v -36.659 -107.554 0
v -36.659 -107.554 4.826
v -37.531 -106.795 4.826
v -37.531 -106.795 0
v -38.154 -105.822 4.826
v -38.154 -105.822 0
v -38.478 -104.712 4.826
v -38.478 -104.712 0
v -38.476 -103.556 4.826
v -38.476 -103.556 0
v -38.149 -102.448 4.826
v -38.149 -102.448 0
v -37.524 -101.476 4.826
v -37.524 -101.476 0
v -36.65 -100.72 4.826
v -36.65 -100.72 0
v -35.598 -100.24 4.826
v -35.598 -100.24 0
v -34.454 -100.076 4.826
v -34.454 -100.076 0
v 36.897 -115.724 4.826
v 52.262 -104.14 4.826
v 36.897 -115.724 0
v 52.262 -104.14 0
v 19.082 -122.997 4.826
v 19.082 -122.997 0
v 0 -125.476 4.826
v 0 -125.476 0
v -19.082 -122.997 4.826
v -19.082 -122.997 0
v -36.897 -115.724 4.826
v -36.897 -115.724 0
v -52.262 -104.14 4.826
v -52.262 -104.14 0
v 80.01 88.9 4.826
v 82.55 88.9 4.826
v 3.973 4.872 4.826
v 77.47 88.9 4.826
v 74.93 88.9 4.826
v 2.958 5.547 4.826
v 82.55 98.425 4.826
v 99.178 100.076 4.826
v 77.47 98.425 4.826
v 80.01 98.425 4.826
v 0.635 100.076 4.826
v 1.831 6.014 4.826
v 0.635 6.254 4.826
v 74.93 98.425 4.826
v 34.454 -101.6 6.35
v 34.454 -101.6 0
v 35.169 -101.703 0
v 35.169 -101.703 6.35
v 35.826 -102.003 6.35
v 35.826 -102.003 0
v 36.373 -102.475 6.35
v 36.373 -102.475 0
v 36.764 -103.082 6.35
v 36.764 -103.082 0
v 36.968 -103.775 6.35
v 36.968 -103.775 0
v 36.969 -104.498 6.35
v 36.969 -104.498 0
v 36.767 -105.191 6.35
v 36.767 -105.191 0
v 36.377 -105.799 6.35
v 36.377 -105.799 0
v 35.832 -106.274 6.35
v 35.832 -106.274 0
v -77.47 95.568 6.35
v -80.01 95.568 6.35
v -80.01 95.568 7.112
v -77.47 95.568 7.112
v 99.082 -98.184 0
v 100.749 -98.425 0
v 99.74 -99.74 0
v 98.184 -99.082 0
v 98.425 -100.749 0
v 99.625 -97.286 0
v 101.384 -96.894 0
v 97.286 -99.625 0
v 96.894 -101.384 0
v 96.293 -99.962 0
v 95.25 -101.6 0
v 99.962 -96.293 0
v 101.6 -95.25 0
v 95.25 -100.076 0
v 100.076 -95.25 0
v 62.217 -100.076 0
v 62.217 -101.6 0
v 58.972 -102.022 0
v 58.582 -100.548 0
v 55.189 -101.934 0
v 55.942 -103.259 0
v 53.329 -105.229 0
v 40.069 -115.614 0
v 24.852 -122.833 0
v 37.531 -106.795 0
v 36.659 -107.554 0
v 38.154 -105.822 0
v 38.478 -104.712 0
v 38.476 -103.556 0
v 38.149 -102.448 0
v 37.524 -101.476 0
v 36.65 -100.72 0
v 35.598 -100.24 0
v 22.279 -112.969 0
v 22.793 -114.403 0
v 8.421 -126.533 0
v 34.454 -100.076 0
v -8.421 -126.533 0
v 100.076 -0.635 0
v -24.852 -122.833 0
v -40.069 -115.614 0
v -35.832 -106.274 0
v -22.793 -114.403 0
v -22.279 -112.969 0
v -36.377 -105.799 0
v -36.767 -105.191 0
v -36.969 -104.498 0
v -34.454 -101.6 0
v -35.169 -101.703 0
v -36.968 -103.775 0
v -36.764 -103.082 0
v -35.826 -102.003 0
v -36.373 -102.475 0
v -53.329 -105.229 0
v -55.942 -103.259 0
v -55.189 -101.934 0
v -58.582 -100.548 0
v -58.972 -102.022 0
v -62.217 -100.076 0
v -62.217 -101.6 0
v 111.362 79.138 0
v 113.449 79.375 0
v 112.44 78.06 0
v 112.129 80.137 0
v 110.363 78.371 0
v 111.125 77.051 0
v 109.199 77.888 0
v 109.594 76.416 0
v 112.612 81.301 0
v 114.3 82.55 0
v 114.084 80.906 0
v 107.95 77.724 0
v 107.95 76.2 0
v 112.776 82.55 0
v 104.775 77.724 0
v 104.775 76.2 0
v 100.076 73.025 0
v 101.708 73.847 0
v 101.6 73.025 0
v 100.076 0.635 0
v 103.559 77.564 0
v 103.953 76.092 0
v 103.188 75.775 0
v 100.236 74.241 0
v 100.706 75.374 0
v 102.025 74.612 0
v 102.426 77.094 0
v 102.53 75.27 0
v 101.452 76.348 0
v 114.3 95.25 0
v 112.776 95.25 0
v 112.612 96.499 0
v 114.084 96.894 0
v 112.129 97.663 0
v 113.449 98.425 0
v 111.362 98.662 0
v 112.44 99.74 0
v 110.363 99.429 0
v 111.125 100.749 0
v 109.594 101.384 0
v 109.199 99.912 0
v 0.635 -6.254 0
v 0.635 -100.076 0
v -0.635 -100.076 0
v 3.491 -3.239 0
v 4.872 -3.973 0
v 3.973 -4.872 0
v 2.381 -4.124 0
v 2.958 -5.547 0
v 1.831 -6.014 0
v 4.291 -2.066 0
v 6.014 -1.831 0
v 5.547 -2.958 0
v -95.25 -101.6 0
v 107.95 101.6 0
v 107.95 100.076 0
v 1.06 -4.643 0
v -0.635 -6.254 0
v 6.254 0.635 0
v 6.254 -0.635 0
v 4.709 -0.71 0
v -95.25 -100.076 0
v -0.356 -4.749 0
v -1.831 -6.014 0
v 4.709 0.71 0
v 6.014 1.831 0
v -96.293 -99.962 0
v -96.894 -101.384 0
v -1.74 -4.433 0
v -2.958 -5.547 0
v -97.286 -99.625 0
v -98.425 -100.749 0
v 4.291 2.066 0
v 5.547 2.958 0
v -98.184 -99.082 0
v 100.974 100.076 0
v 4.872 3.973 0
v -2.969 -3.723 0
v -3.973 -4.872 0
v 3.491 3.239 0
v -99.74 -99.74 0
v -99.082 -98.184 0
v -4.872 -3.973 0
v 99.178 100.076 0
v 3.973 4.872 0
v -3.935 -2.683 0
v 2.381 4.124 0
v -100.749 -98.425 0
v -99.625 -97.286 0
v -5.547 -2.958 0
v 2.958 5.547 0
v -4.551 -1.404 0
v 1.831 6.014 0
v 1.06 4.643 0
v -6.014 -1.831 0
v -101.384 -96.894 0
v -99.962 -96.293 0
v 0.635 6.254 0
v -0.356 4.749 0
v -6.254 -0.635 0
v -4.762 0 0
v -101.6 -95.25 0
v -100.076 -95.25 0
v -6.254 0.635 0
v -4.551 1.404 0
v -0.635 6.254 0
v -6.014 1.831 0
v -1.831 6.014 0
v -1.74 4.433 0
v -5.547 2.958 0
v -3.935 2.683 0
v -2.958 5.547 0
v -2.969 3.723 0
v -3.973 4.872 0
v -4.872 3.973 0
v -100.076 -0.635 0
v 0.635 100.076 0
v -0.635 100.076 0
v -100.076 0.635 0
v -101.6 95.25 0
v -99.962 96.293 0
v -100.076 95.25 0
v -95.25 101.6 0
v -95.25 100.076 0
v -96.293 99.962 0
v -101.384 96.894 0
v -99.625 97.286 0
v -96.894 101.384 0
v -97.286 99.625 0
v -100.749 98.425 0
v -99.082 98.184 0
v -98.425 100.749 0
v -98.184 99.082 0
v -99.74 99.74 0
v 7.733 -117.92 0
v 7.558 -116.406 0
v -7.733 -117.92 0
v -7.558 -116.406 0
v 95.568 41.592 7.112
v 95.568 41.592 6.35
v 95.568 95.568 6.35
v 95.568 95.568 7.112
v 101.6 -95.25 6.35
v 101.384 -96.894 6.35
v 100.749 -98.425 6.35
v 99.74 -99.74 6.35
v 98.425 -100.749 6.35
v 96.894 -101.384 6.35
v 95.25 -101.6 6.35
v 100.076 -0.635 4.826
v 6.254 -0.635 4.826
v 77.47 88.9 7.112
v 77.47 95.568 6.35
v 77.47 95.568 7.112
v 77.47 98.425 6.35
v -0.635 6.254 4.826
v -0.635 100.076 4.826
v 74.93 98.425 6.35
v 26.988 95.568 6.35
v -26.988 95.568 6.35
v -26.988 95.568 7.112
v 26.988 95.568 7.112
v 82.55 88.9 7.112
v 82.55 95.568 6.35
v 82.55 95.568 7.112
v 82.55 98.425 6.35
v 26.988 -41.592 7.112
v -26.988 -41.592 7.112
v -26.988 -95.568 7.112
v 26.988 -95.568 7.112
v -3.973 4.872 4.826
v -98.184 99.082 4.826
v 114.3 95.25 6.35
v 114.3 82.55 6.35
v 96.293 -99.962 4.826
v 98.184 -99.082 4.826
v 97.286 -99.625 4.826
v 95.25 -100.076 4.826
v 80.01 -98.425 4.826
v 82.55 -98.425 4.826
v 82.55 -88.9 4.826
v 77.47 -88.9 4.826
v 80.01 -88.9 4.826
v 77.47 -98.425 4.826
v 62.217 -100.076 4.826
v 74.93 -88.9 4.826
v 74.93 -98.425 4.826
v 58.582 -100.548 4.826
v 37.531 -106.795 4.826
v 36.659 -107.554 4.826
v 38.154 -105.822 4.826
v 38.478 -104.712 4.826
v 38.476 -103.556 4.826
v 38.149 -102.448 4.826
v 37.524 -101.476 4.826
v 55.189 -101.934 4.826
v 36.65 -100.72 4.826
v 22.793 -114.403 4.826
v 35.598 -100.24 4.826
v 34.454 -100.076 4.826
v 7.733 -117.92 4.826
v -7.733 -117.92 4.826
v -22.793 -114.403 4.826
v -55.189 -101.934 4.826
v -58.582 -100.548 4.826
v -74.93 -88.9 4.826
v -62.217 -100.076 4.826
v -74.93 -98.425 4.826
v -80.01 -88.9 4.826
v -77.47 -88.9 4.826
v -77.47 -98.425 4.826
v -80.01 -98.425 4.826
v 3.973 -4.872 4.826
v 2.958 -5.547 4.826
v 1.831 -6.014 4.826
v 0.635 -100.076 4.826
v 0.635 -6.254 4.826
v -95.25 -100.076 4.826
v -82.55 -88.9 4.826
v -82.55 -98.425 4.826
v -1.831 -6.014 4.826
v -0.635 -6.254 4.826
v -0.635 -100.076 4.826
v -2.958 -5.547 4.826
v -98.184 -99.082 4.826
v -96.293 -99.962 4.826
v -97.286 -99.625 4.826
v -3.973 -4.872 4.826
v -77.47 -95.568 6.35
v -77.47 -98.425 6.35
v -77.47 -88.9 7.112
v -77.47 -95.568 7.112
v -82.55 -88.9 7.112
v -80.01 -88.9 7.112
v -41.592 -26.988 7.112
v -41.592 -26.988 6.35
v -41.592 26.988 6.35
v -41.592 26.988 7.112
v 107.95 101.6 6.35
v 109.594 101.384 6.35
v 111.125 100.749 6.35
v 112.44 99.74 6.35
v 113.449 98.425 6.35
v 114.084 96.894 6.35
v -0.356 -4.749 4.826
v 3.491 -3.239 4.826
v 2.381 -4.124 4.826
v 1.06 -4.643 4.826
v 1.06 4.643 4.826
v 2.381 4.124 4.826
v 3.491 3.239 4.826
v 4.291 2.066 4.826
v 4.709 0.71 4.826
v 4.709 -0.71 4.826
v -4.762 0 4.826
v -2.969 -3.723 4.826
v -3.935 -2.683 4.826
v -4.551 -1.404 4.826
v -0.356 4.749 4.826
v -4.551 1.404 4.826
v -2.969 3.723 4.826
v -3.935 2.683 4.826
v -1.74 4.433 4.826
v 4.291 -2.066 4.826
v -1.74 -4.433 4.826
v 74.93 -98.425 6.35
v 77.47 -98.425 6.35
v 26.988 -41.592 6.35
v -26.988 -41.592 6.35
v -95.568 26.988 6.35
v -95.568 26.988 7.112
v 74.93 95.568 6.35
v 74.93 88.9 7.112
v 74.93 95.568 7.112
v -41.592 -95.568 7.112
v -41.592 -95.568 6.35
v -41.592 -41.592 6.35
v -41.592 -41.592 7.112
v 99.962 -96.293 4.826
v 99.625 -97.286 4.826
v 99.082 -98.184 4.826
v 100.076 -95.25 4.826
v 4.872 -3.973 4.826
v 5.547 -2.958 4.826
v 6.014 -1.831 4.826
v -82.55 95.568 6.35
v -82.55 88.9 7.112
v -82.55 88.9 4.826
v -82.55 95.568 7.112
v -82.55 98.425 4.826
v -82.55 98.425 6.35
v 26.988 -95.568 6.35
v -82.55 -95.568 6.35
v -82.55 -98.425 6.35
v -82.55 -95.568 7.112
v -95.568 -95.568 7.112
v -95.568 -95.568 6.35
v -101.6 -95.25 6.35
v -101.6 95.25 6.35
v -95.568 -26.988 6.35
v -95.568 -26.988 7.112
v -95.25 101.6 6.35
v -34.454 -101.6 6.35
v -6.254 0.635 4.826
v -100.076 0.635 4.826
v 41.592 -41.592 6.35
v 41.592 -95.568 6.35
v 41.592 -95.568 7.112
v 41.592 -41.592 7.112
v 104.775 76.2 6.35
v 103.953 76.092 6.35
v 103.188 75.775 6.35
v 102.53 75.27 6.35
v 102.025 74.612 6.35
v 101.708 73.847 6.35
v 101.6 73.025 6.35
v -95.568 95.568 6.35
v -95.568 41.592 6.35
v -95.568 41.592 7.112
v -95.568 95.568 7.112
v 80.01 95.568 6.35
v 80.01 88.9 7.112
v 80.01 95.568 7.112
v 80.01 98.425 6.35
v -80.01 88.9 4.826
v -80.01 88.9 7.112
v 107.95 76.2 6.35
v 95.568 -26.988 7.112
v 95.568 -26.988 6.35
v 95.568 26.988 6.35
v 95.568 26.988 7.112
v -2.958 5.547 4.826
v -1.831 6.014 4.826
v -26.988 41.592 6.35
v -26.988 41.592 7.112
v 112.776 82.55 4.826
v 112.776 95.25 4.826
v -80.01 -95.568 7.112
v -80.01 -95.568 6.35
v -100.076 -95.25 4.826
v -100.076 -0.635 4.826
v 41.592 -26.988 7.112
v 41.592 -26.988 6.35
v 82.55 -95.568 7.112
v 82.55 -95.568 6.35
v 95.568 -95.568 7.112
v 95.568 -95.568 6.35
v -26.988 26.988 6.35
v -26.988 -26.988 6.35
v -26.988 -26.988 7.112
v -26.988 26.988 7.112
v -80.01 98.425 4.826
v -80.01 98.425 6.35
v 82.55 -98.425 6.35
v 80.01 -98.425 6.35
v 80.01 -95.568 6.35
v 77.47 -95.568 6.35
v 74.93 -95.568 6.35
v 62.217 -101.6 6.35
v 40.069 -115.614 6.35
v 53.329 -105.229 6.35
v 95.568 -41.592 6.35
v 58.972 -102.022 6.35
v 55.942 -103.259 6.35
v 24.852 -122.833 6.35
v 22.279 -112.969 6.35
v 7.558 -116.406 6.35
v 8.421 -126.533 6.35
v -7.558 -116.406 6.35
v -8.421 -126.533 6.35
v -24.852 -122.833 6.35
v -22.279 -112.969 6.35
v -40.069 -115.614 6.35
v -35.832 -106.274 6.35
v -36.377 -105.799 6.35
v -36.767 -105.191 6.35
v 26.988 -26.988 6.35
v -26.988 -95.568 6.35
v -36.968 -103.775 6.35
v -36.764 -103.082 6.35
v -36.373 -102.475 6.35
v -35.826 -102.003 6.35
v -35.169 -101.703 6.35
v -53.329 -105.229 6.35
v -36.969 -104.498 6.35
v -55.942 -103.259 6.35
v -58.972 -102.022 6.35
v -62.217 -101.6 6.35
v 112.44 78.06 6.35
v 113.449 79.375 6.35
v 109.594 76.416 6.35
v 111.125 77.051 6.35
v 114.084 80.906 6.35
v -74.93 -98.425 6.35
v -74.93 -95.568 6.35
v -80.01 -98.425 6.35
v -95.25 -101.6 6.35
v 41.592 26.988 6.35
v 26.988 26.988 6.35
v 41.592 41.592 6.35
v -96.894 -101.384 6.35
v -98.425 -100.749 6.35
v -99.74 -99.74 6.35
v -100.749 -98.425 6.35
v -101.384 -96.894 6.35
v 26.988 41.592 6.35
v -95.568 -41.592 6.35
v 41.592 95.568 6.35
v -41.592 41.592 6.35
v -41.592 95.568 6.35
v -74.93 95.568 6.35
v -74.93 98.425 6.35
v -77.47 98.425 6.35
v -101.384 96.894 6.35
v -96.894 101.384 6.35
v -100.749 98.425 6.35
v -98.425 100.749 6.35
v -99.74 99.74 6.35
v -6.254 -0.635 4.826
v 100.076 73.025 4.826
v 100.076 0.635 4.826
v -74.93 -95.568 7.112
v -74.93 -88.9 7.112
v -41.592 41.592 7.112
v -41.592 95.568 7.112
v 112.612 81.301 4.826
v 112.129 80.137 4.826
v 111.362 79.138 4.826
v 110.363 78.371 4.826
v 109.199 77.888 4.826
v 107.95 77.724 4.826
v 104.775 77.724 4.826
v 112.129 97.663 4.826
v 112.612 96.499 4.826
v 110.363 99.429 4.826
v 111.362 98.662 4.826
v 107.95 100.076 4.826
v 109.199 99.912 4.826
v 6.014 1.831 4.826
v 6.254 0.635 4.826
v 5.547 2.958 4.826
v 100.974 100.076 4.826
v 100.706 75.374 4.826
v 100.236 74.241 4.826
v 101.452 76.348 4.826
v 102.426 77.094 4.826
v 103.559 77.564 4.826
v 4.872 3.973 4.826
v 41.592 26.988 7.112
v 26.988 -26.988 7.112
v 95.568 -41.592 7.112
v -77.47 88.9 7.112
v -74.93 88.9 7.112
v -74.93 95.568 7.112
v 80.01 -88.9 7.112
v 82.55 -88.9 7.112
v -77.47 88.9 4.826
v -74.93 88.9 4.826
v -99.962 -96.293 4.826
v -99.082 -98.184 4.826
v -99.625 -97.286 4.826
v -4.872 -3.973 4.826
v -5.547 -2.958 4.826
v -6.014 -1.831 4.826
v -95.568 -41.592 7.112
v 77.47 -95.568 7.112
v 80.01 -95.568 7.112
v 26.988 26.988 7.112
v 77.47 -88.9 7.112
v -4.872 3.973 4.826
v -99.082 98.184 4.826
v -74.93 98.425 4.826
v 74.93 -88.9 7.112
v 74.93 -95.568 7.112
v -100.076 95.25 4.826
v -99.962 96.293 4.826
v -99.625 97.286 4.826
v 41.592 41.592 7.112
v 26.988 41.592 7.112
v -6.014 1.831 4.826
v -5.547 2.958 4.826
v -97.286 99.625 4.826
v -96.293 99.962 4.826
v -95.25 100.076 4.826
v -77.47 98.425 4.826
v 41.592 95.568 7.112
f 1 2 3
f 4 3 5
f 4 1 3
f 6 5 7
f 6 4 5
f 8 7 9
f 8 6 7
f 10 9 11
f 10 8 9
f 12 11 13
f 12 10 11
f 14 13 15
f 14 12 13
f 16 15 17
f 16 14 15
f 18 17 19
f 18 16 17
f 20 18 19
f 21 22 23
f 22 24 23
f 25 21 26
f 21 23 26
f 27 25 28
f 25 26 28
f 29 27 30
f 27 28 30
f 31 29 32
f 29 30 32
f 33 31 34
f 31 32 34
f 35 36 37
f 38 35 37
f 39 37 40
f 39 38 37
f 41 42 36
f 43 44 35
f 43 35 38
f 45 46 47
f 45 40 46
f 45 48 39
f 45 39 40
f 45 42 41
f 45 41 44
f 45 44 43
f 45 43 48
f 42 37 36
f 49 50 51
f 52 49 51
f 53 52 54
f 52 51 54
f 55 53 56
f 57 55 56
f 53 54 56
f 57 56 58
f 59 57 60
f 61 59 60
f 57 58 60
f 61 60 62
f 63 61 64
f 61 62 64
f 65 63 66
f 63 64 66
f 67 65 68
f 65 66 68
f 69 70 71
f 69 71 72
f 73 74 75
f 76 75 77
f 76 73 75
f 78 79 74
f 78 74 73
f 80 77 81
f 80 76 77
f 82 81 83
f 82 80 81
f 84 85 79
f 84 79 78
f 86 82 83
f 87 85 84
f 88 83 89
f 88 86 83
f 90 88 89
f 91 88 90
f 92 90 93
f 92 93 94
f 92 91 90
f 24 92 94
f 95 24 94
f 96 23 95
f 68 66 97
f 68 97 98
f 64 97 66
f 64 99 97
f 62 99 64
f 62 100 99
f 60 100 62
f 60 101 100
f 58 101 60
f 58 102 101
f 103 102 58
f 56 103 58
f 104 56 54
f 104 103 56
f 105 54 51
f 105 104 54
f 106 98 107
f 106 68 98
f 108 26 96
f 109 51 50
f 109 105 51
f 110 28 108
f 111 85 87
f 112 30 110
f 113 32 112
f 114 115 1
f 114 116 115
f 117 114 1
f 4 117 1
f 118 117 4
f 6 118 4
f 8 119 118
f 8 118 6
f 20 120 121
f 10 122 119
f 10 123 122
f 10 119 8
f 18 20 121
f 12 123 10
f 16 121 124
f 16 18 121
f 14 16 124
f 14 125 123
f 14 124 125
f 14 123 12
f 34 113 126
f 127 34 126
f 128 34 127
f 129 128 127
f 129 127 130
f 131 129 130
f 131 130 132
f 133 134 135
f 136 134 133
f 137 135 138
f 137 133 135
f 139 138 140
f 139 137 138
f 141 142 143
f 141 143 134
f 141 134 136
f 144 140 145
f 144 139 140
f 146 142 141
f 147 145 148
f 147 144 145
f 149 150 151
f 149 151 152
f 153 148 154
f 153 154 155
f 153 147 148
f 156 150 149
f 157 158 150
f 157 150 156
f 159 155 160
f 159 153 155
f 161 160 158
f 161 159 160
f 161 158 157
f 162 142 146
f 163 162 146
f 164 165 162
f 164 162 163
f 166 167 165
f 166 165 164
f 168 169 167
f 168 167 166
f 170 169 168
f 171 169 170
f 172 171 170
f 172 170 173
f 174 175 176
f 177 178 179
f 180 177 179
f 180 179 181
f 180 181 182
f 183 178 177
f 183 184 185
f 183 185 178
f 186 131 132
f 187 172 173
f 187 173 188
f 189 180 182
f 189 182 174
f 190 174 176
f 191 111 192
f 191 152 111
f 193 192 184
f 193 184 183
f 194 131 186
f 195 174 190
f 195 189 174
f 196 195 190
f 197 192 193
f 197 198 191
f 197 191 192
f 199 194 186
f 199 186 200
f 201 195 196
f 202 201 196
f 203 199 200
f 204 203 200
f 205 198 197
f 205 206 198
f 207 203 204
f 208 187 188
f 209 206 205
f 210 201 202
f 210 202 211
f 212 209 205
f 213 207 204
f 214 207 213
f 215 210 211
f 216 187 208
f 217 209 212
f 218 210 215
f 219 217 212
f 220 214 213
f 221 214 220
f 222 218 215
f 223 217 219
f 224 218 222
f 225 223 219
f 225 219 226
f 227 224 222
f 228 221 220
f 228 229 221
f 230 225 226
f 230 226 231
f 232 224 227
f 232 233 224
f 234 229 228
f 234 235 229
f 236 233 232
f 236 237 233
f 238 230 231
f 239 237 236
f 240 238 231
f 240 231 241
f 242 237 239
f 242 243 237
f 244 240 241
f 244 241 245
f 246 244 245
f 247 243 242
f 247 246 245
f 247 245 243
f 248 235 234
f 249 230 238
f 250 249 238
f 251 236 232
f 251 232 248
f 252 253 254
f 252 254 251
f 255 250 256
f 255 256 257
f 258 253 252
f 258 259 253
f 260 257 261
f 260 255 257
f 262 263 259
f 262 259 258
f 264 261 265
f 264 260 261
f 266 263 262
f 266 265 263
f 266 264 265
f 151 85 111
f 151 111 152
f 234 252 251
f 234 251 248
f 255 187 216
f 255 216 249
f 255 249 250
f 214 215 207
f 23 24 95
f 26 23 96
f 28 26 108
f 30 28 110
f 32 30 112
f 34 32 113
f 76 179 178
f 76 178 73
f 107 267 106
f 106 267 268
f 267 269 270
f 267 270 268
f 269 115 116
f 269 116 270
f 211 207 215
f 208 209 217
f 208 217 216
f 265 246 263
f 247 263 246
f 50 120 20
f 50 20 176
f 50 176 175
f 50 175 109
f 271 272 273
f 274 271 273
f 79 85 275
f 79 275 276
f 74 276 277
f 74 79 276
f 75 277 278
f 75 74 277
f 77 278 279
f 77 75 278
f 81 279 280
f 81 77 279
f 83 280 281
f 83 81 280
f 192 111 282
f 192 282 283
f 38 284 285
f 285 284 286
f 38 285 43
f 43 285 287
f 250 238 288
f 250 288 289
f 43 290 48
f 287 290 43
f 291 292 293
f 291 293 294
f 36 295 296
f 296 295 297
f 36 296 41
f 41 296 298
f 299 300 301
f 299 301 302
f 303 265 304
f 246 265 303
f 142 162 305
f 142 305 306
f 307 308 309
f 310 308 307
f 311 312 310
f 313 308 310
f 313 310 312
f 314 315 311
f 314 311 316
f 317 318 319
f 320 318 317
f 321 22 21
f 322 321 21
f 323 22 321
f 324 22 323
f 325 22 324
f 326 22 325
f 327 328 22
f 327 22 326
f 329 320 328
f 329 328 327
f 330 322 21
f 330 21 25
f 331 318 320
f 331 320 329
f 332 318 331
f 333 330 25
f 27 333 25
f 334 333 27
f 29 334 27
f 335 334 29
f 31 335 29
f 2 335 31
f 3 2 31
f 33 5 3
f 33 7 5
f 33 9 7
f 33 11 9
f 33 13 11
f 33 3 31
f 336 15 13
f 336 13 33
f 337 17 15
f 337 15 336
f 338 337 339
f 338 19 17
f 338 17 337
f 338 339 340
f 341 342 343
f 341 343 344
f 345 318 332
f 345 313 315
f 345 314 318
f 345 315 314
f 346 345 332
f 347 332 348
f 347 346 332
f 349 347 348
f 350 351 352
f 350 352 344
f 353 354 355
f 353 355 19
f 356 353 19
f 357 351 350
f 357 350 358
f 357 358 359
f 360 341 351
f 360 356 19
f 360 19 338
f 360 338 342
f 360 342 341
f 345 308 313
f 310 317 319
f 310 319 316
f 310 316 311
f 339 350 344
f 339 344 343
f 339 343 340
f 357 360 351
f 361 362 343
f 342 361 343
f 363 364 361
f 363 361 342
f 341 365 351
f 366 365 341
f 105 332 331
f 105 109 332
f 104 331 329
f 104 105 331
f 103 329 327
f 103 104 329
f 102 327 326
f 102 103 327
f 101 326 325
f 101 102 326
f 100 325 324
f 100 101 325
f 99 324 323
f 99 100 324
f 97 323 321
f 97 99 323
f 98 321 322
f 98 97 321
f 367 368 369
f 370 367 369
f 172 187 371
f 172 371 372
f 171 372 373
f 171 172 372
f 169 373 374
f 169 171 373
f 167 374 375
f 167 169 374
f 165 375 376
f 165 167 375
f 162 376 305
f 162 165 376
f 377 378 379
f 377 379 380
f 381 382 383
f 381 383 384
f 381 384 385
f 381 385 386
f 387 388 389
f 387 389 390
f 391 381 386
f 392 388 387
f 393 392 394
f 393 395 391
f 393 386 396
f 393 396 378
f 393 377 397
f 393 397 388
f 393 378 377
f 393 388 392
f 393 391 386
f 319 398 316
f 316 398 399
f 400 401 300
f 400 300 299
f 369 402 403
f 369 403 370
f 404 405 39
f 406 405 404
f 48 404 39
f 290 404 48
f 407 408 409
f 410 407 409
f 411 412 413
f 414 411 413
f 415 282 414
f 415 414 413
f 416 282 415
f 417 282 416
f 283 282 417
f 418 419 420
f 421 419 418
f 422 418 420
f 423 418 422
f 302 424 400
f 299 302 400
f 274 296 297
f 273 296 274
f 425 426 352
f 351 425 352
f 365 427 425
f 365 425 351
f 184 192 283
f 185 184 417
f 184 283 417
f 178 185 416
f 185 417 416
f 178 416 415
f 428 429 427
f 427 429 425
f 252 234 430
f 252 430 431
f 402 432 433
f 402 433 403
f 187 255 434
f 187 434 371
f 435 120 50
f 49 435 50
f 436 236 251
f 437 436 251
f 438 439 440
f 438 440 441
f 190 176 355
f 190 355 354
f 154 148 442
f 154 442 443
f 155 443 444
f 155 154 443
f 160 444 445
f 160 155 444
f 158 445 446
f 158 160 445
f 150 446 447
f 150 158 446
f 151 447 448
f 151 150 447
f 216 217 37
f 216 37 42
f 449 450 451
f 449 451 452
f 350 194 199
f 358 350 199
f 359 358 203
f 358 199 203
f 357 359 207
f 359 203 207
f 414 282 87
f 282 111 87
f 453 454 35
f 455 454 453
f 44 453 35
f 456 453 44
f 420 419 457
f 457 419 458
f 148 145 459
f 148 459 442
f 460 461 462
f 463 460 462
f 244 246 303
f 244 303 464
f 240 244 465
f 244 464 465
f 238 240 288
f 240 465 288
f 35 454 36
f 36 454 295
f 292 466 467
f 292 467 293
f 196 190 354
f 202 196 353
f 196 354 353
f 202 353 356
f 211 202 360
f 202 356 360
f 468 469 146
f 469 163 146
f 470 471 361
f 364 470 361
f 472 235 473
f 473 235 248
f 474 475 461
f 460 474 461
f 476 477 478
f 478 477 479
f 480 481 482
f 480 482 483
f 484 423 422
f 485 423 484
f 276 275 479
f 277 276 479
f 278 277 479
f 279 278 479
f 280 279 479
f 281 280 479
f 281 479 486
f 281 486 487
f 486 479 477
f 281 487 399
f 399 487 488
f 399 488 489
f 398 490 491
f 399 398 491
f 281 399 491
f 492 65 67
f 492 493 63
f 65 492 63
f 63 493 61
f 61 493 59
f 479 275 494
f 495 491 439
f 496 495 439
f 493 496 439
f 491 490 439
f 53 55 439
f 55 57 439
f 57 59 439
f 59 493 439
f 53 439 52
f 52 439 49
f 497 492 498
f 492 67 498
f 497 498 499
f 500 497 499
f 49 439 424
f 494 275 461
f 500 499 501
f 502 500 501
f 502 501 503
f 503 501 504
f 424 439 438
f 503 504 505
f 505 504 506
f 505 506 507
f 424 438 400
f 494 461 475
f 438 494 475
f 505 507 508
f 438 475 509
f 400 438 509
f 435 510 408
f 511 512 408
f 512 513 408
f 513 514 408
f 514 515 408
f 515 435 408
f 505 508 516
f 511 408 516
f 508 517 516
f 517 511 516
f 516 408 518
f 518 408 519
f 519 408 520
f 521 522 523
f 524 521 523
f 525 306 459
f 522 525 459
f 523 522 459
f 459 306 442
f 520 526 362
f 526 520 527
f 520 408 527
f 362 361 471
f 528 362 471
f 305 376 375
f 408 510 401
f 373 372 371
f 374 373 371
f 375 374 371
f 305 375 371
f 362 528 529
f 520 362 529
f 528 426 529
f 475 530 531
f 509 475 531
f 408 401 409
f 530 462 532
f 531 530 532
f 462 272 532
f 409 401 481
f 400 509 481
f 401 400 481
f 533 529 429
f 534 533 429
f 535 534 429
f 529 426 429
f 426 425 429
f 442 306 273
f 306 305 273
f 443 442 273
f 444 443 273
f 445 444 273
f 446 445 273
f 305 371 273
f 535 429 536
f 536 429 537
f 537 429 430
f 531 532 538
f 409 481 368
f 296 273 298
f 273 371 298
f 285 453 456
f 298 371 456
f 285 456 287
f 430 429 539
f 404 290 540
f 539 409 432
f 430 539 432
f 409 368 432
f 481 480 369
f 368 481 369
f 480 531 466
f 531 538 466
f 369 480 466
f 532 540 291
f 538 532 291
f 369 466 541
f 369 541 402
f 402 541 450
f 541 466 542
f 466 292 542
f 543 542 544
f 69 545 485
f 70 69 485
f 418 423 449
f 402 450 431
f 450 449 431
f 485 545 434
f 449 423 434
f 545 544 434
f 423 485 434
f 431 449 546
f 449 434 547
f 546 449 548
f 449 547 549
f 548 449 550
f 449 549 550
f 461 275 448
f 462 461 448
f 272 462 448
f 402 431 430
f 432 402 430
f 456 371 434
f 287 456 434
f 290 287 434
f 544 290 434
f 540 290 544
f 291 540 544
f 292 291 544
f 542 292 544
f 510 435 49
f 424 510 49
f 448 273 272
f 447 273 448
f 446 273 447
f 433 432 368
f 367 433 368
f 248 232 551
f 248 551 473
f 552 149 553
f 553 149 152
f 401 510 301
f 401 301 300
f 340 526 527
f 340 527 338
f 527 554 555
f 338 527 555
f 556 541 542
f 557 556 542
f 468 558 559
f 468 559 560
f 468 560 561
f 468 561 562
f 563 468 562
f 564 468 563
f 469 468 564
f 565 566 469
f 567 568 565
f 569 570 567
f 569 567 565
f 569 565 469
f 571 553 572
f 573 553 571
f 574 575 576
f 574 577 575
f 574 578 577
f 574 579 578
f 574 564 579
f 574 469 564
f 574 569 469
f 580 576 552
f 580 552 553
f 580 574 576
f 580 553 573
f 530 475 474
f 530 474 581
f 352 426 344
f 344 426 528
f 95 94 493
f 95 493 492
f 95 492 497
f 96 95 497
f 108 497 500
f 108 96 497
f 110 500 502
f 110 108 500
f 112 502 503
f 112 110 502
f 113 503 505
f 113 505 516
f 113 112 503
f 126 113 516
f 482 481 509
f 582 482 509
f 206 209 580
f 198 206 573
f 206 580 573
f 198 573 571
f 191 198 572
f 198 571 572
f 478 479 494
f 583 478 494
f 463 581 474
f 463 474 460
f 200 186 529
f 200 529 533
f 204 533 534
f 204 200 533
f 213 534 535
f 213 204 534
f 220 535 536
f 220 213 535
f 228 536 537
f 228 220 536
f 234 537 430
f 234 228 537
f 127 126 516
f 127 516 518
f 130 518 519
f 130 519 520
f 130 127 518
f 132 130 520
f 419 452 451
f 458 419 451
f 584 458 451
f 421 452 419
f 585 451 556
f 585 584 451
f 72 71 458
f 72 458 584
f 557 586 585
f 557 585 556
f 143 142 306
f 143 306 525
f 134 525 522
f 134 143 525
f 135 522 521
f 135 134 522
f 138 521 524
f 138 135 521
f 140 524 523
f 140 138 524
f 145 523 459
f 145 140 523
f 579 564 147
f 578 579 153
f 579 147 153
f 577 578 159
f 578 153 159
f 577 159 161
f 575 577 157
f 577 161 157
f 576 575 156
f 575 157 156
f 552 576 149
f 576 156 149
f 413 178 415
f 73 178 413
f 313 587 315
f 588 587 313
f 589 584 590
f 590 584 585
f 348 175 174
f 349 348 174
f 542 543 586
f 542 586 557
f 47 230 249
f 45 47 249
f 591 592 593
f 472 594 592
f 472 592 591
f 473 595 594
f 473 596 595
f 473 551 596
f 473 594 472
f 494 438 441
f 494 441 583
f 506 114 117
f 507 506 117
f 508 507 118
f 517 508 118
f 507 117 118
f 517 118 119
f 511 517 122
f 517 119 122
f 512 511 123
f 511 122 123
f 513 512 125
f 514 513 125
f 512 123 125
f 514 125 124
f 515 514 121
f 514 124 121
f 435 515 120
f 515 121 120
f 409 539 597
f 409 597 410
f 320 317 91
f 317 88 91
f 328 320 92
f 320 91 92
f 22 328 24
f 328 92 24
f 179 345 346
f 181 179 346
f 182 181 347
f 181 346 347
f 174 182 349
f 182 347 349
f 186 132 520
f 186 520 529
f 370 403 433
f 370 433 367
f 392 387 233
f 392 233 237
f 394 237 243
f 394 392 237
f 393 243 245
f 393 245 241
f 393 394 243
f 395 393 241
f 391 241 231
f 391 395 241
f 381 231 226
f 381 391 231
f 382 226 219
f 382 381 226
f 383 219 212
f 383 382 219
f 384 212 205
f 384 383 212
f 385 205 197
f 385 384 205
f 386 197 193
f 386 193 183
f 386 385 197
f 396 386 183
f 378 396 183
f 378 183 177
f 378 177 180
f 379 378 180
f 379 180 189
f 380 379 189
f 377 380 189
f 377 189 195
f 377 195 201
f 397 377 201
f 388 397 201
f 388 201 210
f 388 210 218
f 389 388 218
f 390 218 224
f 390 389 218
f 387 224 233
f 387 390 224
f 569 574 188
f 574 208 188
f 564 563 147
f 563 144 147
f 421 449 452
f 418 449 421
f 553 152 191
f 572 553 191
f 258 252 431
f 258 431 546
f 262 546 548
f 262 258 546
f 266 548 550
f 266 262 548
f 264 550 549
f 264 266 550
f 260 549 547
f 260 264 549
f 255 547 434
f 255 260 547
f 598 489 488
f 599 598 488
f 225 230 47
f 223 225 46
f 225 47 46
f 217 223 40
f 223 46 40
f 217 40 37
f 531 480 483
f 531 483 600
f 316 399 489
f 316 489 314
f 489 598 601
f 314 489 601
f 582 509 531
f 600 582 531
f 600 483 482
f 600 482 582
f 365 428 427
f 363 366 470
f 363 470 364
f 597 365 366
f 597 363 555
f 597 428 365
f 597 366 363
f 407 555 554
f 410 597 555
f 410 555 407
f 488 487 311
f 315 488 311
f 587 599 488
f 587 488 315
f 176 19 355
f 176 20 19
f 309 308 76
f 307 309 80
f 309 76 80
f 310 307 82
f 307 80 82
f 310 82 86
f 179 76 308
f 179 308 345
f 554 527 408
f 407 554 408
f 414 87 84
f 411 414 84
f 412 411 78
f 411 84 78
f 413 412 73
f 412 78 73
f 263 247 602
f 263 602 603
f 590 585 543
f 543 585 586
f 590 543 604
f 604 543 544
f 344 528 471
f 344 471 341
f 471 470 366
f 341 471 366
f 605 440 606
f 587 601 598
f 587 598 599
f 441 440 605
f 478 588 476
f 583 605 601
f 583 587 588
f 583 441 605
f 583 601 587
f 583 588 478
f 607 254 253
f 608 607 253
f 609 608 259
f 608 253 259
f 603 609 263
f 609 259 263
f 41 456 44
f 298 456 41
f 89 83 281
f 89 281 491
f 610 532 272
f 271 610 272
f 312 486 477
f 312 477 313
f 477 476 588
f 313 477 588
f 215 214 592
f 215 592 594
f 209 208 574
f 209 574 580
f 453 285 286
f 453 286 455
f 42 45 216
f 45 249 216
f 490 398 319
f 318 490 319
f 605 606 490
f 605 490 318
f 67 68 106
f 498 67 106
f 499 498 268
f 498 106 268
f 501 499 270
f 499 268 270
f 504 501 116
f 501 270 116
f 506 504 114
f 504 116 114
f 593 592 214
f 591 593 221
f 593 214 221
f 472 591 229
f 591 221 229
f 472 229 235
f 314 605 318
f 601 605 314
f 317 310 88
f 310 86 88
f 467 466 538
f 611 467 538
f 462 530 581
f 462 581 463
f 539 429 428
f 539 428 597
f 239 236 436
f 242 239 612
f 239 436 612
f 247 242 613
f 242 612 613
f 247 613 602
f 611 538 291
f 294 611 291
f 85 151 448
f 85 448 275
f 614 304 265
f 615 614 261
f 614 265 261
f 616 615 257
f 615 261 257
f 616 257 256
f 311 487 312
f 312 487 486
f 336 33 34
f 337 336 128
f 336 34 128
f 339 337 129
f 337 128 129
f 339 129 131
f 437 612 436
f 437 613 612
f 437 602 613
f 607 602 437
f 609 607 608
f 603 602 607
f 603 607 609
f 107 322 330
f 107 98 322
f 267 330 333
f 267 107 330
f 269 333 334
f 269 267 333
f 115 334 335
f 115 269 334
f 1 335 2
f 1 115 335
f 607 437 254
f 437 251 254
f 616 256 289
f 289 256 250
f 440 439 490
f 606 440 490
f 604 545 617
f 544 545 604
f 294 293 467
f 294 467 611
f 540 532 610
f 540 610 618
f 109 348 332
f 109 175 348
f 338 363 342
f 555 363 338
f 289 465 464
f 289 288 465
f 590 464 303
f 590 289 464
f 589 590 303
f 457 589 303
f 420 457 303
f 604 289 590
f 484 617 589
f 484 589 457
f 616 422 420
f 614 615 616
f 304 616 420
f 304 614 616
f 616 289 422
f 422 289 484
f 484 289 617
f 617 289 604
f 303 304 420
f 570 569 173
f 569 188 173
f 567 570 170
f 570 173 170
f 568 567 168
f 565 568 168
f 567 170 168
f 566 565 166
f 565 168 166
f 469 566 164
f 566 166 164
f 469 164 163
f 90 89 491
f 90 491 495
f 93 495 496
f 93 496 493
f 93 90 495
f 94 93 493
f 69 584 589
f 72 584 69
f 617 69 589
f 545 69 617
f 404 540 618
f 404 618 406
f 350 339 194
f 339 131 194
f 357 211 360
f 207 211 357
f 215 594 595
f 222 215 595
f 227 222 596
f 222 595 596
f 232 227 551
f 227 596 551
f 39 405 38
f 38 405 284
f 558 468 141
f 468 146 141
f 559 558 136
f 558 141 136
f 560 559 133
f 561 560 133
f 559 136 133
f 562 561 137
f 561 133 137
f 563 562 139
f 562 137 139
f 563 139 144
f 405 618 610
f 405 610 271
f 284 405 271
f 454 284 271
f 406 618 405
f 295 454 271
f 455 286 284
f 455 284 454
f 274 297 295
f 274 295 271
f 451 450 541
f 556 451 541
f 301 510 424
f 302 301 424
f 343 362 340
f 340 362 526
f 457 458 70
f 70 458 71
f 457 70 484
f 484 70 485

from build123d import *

# Parameters (mm, degrees)
BOSS_EXTRUDE1_DEPTH = 6.35
SHELL1_T            = -1.524
SKETCH2_W           = 53.975
SKETCH2_H           = 53.975
BOSS_EXTRUDE2_DEPTH = 0.762
SKETCH3_W           = 2.54
SKETCH3_H           = 9.525
CUT_EXTRUDE1_DEPTH  = 172.008977963
SKETCH4_R           = 6.2865
SKETCH4_R_2         = 4.7625
BOSS_EXTRUDE3_DEPTH = 4.826
RIB1_REACH          = 173.009
SKETCH5_WALLS_W     = 437.807455926
SKETCH5_WALLS_H     = 1.27
SKETCH5_WALLS_W_2   = 1.27
SKETCH5_WALLS_H_2   = 437.807455926


with BuildPart() as part:
    # Sketch1 → Boss-Extrude1 (new body)
    with BuildSketch(Plane.XY):
        with BuildLine():
            Line((101.6, 101.6), (107.95, 101.6))
            ThreePointArc((107.95, 101.6), (112.440128061, 99.740128061), (114.3, 95.25))
            Line((114.3, 95.25), (114.3, 82.55))
            ThreePointArc((114.3, 82.55), (112.440128061, 78.059871939), (107.95, 76.2))
            Line((107.95, 76.2), (104.775, 76.2))
            ThreePointArc((104.775, 76.2), (102.52993597, 75.27006403), (101.6, 73.025))
            Line((101.6, 73.025), (101.6, -95.25))
            ThreePointArc((101.6, -95.25), (99.740128061, -99.740128061), (95.25, -101.6))
            Line((95.25, -101.6), (62.217039467, -101.6))
            ThreePointArc((62.217039467, -101.6), (57.416890659, -102.542084733), (53.328890971, -105.228571429))
            ThreePointArc((53.328890971, -105.228571429), (0, -127), (-53.328890971, -105.228571429))
            ThreePointArc((-53.328890971, -105.228571429), (-57.416890659, -102.542084733), (-62.217039467, -101.6))
            Line((-62.217039467, -101.6), (-95.25, -101.6))
            ThreePointArc((-95.25, -101.6), (-99.740128061, -99.740128061), (-101.6, -95.25))
            Line((-101.6, -95.25), (-101.6, 95.25))
            ThreePointArc((-101.6, 95.25), (-99.740128061, 99.740128061), (-95.25, 101.6))
            Line((-95.25, 101.6), (101.6, 101.6))
        make_face()
        with BuildLine():
            Line((-34.454236314, -101.6), (34.454236314, -101.6))
            ThreePointArc((34.454236314, -101.6), (36.890518728, -103.42157951), (35.832405767, -106.2736))
            ThreePointArc((35.832405767, -106.2736), (0, -116.84), (-35.832405767, -106.2736))
            ThreePointArc((-35.832405767, -106.2736), (-36.890518728, -103.42157951), (-34.454236314, -101.6))
        make_face(mode=Mode.SUBTRACT)
    extrude(amount=BOSS_EXTRUDE1_DEPTH)

    # Shell1
    shell1_openings = [part.faces().sort_by_distance(p)[0] for p in [
        (0.794834734, -2.433656068, 0),
    ]]
    offset(amount=SHELL1_T, openings=shell1_openings, kind=Kind.INTERSECTION)

    # Sketch2 → Boss-Extrude2 (add)
    with BuildSketch(Plane.XY.offset(6.35)):
        with Locations((68.58, 0)):
            Rectangle(SKETCH2_W, SKETCH2_H)
        Rectangle(SKETCH2_W, SKETCH2_H)
        with Locations((68.58, 68.58)):
            Rectangle(SKETCH2_W, SKETCH2_H)
        with Locations((68.58, -68.58)):
            Rectangle(SKETCH2_W, SKETCH2_H)
        with Locations((0, -68.58)):
            Rectangle(SKETCH2_W, SKETCH2_H)
        with Locations((-68.58, -68.58)):
            Rectangle(SKETCH2_W, SKETCH2_H)
        with Locations((-68.58, 0)):
            Rectangle(SKETCH2_W, SKETCH2_H)
        with Locations((-68.58, 68.58)):
            Rectangle(SKETCH2_W, SKETCH2_H)
        with Locations((0, 68.58)):
            Rectangle(SKETCH2_W, SKETCH2_H)
    extrude(amount=BOSS_EXTRUDE2_DEPTH)

    # Sketch3 → Cut-Extrude1 (cut, through all)
    with BuildSketch(Plane.XY.offset(7.112)):
        with Locations((-81.28, 93.6625)):
            Rectangle(SKETCH3_W, SKETCH3_H)
        with Locations((-76.2, 93.6625)):
            Rectangle(SKETCH3_W, SKETCH3_H)
        with Locations((76.2, 93.6625)):
            Rectangle(SKETCH3_W, SKETCH3_H)
        with Locations((81.28, 93.6625)):
            Rectangle(SKETCH3_W, SKETCH3_H)
        with Locations((81.28, -93.6625)):
            Rectangle(SKETCH3_W, SKETCH3_H)
        with Locations((76.2, -93.6625)):
            Rectangle(SKETCH3_W, SKETCH3_H)
        with Locations((-76.2, -93.6625)):
            Rectangle(SKETCH3_W, SKETCH3_H)
        with Locations((-81.28, -93.6625)):
            Rectangle(SKETCH3_W, SKETCH3_H)
    extrude(amount=-CUT_EXTRUDE1_DEPTH, mode=Mode.SUBTRACT)

    # Sketch4 → Boss-Extrude3 (add)
    with BuildSketch(Plane(origin=(0, 0, 4.826), x_dir=(-1, 0, 0), z_dir=(0, 0, -1))):
        Circle(SKETCH4_R)
        Circle(SKETCH4_R_2, mode=Mode.SUBTRACT)
    extrude(amount=BOSS_EXTRUDE3_DEPTH)

    # Sketch5 walls → Rib1 (add, up to next)
    with BuildSketch(Plane(origin=(0, 0, 0), x_dir=(-1, 0, 0), z_dir=(0, 0, -1)), mode=Mode.PRIVATE) as rib1_sk1:
        with Locations((53.18125, 0)):
            Rectangle(SKETCH5_WALLS_W, SKETCH5_WALLS_H)
    rib1_tool1 = extrude(rib1_sk1.sketch, amount=-RIB1_REACH, mode=Mode.PRIVATE) - part.part
    # Sketch5 walls → Rib1 (add, up to next)
    with BuildSketch(Plane(origin=(0, 0, 0), x_dir=(-1, 0, 0), z_dir=(0, 0, -1)), mode=Mode.PRIVATE) as rib1_sk2:
        with Locations((-53.18125, 0)):
            Rectangle(SKETCH5_WALLS_W, SKETCH5_WALLS_H)
    rib1_tool2 = extrude(rib1_sk2.sketch, amount=-RIB1_REACH, mode=Mode.PRIVATE) - part.part
    # Sketch5 walls → Rib1 (add, up to next)
    with BuildSketch(Plane(origin=(0, 0, 0), x_dir=(-1, 0, 0), z_dir=(0, 0, -1)), mode=Mode.PRIVATE) as rib1_sk3:
        with Locations((0, -53.18125)):
            Rectangle(SKETCH5_WALLS_W_2, SKETCH5_WALLS_H_2)
    rib1_tool3 = extrude(rib1_sk3.sketch, amount=-RIB1_REACH, mode=Mode.PRIVATE) - part.part
    # Sketch5 walls → Rib1 (add, up to next)
    with BuildSketch(Plane(origin=(0, 0, 0), x_dir=(-1, 0, 0), z_dir=(0, 0, -1)), mode=Mode.PRIVATE) as rib1_sk4:
        with Locations((0, 53.18125)):
            Rectangle(SKETCH5_WALLS_W_2, SKETCH5_WALLS_H_2)
    rib1_tool4 = extrude(rib1_sk4.sketch, amount=-RIB1_REACH, mode=Mode.PRIVATE) - part.part
    # Sketch5 walls → Rib1 (add, up to next)
    with BuildSketch(Plane(origin=(0, 0, 0), x_dir=(-1, 0, 0), z_dir=(0, 0, -1)), mode=Mode.PRIVATE) as rib1_sk5:
        Polygon((-116.734475157, -117.632500769), (220.740224875, 219.842199263), (219.842199263, 220.740224875), (-117.632500769, -116.734475157), align=None)
    rib1_tool5 = extrude(rib1_sk5.sketch, amount=-RIB1_REACH, mode=Mode.PRIVATE) - part.part
    # Sketch5 walls → Rib1 (add, up to next)
    with BuildSketch(Plane(origin=(0, 0, 0), x_dir=(-1, 0, 0), z_dir=(0, 0, -1)), mode=Mode.PRIVATE) as rib1_sk6:
        Polygon((-117.632500769, 116.734475157), (219.842199263, -220.740224875), (220.740224875, -219.842199263), (-116.734475157, 117.632500769), align=None)
    rib1_tool6 = extrude(rib1_sk6.sketch, amount=-RIB1_REACH, mode=Mode.PRIVATE) - part.part
    # Sketch5 walls → Rib1 (add, up to next)
    with BuildSketch(Plane(origin=(0, 0, 0), x_dir=(-1, 0, 0), z_dir=(0, 0, -1)), mode=Mode.PRIVATE) as rib1_sk7:
        Polygon((116.734475157, 117.632500769), (-220.740224875, -219.842199263), (-219.842199263, -220.740224875), (117.632500769, 116.734475157), align=None)
    rib1_tool7 = extrude(rib1_sk7.sketch, amount=-RIB1_REACH, mode=Mode.PRIVATE) - part.part
    # Sketch5 walls → Rib1 (add, up to next)
    with BuildSketch(Plane(origin=(0, 0, 0), x_dir=(-1, 0, 0), z_dir=(0, 0, -1)), mode=Mode.PRIVATE) as rib1_sk8:
        Polygon((117.632500769, -116.734475157), (-221.255701937, 222.153727549), (-222.153727549, 221.255701937), (116.734475157, -117.632500769), align=None)
    rib1_tool8 = extrude(rib1_sk8.sketch, amount=-RIB1_REACH, mode=Mode.PRIVATE) - part.part
    add(rib1_tool1.solids().sort_by_distance((-53.18125, 0, 0))[0])
    add(rib1_tool2.solids().sort_by_distance((53.18125, 0, 0))[0])
    add(rib1_tool3.solids().sort_by_distance((0, -53.18125, 0))[0])
    add(rib1_tool4.solids().sort_by_distance((0, 53.18125, 0))[0])
    add(rib1_tool5.solids().sort_by_distance((-51.553862053, 51.553862053, 0))[0])
    add(rib1_tool6.solids().sort_by_distance((-51.553862053, -51.553862053, 0))[0])
    add(rib1_tool7.solids().sort_by_distance((51.553862053, -51.553862053, 0))[0])
    add(rib1_tool8.solids().sort_by_distance((52.26061339, 52.26061339, 0))[0])


solid = part.part
